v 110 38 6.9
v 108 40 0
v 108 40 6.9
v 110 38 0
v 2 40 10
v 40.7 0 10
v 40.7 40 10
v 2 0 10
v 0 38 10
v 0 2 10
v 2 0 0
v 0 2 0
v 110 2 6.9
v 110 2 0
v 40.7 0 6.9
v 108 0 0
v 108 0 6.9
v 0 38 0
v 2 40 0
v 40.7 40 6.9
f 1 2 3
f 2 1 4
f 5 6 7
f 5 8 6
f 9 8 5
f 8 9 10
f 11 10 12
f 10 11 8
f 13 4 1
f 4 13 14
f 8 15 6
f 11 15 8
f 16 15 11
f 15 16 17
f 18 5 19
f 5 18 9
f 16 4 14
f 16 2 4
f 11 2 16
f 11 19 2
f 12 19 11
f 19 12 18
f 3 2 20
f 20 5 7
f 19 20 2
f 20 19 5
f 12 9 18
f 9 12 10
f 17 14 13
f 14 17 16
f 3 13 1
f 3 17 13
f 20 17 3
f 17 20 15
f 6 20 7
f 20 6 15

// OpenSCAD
$fn = 32;

// ----------------------------------------------------------------------
// Stepped bar: endstep, 110 x 40 x 10/6.9 mm
// ----------------------------------------------------------------------

// --- parameters (mm) ---
bar_l = 110;              // bar length, X
bar_w = 40;               // bar width, Y
plate_t = 10;             // thickness of the thick zone, Z
thin_t = 6.9;             // thickness of the thin zone
corner_c = 2;             // corner chamfer of the bar
step_cut = 3.1;           // material removed from the thin zone
step_x = 40.7;            // step position from the left end
depth_1 = 3.1;            // depth of cut 1 from the top face

profile = [[2, 0], [108, 0], [110, 2], [110, 38], [108, 40], [2, 40], [0, 38], [0, 2]];  // primary outline, 8 points, counter clockwise
void_1 = [[40.7, -1], [111, -1], [111, 41], [40.7, 41]];  // thin zone beyond the step, 4 points

// --- the one profile operation ---
difference() {
  linear_extrude(height = plate_t) polygon(points = profile);
  translate([0, 0, plate_t - depth_1])
    linear_extrude(height = depth_1 + 1) polygon(points = void_1);
}
